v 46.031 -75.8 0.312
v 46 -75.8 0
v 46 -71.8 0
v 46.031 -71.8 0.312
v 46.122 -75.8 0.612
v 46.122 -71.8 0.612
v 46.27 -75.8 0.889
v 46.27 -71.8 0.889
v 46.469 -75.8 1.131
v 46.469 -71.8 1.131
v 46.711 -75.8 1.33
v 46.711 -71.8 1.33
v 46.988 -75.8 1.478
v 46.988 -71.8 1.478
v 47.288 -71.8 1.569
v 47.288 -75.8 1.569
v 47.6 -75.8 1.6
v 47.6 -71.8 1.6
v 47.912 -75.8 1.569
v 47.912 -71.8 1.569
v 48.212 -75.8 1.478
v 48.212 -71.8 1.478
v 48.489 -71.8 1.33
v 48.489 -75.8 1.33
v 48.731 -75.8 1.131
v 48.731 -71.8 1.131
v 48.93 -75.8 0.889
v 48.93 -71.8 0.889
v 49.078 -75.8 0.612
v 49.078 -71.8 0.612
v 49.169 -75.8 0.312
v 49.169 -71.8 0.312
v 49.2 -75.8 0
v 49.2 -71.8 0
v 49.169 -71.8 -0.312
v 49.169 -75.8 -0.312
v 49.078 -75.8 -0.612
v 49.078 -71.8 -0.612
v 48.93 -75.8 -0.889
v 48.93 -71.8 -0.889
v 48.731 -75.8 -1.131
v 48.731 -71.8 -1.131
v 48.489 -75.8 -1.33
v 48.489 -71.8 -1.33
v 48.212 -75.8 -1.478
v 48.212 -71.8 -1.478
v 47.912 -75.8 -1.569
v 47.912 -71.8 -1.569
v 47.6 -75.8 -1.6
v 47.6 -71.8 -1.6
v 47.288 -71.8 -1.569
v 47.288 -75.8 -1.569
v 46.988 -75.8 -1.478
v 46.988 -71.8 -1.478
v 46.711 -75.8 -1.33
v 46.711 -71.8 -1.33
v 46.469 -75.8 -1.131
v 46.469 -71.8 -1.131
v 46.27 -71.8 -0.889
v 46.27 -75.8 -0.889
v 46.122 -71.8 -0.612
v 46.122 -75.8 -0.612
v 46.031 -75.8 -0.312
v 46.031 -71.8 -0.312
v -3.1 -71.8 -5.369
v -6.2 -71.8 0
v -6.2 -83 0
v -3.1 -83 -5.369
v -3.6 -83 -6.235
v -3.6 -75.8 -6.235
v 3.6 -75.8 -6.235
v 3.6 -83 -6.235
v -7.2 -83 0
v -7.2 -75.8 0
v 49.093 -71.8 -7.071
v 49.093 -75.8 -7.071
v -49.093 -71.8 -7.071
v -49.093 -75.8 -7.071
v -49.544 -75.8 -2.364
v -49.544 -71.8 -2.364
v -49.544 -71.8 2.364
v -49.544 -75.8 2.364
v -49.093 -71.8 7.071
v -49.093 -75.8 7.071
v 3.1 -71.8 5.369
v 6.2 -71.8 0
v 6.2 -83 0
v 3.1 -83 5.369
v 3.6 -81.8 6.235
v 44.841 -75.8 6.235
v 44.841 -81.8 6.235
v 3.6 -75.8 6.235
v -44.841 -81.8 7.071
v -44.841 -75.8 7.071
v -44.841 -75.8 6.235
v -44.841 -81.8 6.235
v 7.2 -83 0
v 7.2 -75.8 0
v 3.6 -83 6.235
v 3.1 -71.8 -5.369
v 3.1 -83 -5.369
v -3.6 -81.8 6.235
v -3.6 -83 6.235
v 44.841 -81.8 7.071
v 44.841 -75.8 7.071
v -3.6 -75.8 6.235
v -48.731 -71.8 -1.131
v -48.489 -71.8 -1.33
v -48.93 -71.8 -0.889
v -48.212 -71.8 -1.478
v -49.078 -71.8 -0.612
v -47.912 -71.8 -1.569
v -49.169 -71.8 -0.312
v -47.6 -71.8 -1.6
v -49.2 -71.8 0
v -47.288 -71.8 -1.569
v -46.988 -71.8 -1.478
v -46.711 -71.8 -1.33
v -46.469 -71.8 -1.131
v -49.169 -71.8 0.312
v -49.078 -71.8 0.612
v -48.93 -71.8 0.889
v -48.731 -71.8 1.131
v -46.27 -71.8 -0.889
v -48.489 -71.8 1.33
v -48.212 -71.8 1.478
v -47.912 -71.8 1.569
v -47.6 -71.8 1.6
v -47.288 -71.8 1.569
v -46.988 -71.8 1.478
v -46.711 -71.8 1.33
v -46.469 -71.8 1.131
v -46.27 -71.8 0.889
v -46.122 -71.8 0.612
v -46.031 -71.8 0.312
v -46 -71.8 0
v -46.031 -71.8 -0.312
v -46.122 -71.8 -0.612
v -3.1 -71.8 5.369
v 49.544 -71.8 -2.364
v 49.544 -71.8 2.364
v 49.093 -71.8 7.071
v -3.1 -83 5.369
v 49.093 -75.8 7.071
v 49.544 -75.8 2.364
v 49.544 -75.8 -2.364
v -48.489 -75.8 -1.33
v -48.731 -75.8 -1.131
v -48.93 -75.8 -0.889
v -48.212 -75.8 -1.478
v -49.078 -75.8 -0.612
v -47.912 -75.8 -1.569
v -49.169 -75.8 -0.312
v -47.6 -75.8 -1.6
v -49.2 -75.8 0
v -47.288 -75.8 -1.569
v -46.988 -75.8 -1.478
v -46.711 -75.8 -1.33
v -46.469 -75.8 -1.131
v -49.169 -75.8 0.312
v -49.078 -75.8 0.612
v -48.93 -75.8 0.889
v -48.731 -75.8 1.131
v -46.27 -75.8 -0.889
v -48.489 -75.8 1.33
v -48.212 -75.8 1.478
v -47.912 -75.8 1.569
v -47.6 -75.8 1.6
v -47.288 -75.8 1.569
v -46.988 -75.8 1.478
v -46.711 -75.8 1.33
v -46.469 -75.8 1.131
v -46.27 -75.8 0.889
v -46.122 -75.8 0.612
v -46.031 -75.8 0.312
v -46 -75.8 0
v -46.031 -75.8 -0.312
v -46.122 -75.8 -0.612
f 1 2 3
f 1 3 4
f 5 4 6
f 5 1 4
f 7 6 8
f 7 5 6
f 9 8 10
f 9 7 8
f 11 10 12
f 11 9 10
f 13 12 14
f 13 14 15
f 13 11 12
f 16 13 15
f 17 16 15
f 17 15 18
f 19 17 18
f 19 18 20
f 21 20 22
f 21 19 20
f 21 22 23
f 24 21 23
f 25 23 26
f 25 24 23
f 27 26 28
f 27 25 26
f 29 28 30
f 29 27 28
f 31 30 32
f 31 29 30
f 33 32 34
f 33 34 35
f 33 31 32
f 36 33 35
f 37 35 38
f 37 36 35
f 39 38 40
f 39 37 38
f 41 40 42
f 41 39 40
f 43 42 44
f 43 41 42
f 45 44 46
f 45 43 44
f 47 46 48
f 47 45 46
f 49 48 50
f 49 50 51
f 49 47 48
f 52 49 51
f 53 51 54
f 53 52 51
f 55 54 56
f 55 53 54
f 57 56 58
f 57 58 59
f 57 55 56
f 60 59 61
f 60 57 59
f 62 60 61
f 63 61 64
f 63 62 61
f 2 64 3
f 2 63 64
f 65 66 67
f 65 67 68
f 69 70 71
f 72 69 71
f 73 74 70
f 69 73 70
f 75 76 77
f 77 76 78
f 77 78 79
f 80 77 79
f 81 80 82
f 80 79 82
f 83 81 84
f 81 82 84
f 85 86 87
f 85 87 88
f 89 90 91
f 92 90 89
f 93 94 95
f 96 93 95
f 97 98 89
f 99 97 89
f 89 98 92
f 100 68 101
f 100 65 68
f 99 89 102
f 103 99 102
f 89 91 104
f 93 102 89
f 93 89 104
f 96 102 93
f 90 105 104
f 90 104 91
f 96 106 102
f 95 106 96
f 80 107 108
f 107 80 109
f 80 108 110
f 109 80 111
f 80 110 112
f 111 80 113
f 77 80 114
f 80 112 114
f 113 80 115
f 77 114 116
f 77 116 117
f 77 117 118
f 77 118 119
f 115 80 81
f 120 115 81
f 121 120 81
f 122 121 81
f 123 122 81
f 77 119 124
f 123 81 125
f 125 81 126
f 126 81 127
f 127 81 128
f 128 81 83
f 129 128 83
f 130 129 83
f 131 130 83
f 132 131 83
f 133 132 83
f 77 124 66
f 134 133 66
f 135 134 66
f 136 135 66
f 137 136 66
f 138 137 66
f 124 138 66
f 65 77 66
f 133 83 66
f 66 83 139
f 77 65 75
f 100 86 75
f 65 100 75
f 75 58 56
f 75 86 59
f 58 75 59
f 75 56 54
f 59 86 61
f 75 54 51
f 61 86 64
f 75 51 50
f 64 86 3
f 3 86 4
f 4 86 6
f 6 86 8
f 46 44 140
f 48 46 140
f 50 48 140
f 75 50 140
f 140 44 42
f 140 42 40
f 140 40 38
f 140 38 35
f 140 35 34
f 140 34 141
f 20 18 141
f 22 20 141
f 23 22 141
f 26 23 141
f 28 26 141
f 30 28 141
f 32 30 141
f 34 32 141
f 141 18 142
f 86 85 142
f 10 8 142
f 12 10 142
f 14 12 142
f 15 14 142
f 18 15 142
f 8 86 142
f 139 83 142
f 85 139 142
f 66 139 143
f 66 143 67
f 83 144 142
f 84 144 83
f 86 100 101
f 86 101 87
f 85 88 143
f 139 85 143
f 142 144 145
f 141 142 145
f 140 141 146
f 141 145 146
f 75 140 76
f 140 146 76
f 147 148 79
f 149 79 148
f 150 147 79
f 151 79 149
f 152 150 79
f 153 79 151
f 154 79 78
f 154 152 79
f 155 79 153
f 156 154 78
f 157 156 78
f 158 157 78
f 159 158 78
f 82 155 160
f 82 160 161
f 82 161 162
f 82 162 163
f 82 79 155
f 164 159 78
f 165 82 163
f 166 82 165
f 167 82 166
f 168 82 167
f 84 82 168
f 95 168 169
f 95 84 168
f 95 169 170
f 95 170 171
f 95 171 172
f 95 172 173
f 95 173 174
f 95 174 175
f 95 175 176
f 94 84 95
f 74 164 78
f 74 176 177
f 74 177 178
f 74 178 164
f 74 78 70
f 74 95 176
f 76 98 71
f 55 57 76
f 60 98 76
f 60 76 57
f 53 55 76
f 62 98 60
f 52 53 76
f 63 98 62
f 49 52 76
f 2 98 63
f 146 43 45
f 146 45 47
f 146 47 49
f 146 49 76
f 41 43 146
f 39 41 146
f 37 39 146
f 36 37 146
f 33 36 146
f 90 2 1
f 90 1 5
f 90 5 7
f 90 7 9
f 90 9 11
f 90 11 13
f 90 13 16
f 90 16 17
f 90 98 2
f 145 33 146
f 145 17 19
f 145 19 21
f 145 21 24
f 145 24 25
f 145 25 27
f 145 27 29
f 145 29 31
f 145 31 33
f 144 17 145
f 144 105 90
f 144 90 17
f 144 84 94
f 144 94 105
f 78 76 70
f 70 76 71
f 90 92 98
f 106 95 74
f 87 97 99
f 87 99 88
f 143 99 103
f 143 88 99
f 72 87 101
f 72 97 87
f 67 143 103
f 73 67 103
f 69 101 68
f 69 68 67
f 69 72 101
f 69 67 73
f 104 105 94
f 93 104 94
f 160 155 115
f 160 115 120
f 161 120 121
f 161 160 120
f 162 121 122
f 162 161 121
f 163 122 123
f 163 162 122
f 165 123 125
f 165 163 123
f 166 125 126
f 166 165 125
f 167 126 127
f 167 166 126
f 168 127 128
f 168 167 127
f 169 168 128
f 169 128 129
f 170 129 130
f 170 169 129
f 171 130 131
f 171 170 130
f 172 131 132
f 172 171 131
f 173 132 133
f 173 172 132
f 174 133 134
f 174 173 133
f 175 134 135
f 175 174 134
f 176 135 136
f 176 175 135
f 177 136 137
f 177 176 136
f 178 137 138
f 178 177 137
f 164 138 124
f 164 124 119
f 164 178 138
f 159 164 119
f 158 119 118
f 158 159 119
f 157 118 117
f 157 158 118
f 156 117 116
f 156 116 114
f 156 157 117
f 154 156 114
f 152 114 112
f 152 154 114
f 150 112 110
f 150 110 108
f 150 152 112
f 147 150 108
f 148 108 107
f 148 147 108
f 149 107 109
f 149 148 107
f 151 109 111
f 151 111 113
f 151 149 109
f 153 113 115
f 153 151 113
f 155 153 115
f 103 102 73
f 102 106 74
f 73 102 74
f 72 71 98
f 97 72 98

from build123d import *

# Parameters (mm, degrees)
SKETCH003_R             = 1.6
PAD003_DEPTH            = 4
SKETCH033_W             = 89.681574
SKETCH033_H             = 0.835685
PAD026_DEPTH            = 6
PAD033_DEPTH            = 7.2
BODY002_PLACEMENT_ANGLE = 180


with BuildPart() as part:
    # Sketch003 → Pad003 (new body)
    with BuildSketch(Plane.XZ):
        with BuildLine():
            Line((-49.09338, 7.071068), (49.09338, 7.071068))
            ThreePointArc((49.09338, -7.071068), (49.6, 0), (49.09338, 7.071068))
            Line((-49.09338, -7.071068), (49.09338, -7.071068))
            ThreePointArc((-49.09338, 7.071068), (-49.6, 0), (-49.09338, -7.071068))
        make_face()
        with Locations((47.6, 0)):
            Circle(SKETCH003_R, mode=Mode.SUBTRACT)
        with Locations((-47.6, 0)):
            Circle(SKETCH003_R, mode=Mode.SUBTRACT)
        Polygon((6.2, 0), (3.1, 5.369358), (-3.1, 5.369358), (-6.2, 0), (-3.1, -5.369358), (3.1, -5.369358), align=None, mode=Mode.SUBTRACT)
    extrude(amount=PAD003_DEPTH)

    # Sketch033 → Pad026 (join)
    with BuildSketch(Plane(origin=(0, 0, 0), x_dir=(1, 0, 0), z_dir=(0, 1, 0))):
        with Locations((0, -6.653225)):
            Rectangle(SKETCH033_W, SKETCH033_H)
    extrude(amount=PAD026_DEPTH)

    # Sketch028 (on Face4 of Pad026) → Pad033 (join)
    with BuildSketch(Plane(origin=(0, 0, 0), x_dir=(1, 0, 0), z_dir=(0, 1, 0))):
        Polygon((3.6, 6.235383), (-3.6, 6.235383), (-7.2, 0), (-3.6, -6.235383), (3.6, -6.235383), (7.2, 0), align=None)
        Polygon((3.1, 5.369358), (-3.1, 5.369358), (-6.2, 0), (-3.1, -5.369358), (3.1, -5.369358), (6.2, 0), align=None, mode=Mode.SUBTRACT)
    extrude(amount=PAD033_DEPTH)


with BuildPart() as part_1:
    # Body002 placement: moved
    add(part.part.moved(Location((0, -75.8, 0))).rotate(Axis((0, -75.8, 0), (0, 0, 1)), BODY002_PLACEMENT_ANGLE))


solid = part_1.part
